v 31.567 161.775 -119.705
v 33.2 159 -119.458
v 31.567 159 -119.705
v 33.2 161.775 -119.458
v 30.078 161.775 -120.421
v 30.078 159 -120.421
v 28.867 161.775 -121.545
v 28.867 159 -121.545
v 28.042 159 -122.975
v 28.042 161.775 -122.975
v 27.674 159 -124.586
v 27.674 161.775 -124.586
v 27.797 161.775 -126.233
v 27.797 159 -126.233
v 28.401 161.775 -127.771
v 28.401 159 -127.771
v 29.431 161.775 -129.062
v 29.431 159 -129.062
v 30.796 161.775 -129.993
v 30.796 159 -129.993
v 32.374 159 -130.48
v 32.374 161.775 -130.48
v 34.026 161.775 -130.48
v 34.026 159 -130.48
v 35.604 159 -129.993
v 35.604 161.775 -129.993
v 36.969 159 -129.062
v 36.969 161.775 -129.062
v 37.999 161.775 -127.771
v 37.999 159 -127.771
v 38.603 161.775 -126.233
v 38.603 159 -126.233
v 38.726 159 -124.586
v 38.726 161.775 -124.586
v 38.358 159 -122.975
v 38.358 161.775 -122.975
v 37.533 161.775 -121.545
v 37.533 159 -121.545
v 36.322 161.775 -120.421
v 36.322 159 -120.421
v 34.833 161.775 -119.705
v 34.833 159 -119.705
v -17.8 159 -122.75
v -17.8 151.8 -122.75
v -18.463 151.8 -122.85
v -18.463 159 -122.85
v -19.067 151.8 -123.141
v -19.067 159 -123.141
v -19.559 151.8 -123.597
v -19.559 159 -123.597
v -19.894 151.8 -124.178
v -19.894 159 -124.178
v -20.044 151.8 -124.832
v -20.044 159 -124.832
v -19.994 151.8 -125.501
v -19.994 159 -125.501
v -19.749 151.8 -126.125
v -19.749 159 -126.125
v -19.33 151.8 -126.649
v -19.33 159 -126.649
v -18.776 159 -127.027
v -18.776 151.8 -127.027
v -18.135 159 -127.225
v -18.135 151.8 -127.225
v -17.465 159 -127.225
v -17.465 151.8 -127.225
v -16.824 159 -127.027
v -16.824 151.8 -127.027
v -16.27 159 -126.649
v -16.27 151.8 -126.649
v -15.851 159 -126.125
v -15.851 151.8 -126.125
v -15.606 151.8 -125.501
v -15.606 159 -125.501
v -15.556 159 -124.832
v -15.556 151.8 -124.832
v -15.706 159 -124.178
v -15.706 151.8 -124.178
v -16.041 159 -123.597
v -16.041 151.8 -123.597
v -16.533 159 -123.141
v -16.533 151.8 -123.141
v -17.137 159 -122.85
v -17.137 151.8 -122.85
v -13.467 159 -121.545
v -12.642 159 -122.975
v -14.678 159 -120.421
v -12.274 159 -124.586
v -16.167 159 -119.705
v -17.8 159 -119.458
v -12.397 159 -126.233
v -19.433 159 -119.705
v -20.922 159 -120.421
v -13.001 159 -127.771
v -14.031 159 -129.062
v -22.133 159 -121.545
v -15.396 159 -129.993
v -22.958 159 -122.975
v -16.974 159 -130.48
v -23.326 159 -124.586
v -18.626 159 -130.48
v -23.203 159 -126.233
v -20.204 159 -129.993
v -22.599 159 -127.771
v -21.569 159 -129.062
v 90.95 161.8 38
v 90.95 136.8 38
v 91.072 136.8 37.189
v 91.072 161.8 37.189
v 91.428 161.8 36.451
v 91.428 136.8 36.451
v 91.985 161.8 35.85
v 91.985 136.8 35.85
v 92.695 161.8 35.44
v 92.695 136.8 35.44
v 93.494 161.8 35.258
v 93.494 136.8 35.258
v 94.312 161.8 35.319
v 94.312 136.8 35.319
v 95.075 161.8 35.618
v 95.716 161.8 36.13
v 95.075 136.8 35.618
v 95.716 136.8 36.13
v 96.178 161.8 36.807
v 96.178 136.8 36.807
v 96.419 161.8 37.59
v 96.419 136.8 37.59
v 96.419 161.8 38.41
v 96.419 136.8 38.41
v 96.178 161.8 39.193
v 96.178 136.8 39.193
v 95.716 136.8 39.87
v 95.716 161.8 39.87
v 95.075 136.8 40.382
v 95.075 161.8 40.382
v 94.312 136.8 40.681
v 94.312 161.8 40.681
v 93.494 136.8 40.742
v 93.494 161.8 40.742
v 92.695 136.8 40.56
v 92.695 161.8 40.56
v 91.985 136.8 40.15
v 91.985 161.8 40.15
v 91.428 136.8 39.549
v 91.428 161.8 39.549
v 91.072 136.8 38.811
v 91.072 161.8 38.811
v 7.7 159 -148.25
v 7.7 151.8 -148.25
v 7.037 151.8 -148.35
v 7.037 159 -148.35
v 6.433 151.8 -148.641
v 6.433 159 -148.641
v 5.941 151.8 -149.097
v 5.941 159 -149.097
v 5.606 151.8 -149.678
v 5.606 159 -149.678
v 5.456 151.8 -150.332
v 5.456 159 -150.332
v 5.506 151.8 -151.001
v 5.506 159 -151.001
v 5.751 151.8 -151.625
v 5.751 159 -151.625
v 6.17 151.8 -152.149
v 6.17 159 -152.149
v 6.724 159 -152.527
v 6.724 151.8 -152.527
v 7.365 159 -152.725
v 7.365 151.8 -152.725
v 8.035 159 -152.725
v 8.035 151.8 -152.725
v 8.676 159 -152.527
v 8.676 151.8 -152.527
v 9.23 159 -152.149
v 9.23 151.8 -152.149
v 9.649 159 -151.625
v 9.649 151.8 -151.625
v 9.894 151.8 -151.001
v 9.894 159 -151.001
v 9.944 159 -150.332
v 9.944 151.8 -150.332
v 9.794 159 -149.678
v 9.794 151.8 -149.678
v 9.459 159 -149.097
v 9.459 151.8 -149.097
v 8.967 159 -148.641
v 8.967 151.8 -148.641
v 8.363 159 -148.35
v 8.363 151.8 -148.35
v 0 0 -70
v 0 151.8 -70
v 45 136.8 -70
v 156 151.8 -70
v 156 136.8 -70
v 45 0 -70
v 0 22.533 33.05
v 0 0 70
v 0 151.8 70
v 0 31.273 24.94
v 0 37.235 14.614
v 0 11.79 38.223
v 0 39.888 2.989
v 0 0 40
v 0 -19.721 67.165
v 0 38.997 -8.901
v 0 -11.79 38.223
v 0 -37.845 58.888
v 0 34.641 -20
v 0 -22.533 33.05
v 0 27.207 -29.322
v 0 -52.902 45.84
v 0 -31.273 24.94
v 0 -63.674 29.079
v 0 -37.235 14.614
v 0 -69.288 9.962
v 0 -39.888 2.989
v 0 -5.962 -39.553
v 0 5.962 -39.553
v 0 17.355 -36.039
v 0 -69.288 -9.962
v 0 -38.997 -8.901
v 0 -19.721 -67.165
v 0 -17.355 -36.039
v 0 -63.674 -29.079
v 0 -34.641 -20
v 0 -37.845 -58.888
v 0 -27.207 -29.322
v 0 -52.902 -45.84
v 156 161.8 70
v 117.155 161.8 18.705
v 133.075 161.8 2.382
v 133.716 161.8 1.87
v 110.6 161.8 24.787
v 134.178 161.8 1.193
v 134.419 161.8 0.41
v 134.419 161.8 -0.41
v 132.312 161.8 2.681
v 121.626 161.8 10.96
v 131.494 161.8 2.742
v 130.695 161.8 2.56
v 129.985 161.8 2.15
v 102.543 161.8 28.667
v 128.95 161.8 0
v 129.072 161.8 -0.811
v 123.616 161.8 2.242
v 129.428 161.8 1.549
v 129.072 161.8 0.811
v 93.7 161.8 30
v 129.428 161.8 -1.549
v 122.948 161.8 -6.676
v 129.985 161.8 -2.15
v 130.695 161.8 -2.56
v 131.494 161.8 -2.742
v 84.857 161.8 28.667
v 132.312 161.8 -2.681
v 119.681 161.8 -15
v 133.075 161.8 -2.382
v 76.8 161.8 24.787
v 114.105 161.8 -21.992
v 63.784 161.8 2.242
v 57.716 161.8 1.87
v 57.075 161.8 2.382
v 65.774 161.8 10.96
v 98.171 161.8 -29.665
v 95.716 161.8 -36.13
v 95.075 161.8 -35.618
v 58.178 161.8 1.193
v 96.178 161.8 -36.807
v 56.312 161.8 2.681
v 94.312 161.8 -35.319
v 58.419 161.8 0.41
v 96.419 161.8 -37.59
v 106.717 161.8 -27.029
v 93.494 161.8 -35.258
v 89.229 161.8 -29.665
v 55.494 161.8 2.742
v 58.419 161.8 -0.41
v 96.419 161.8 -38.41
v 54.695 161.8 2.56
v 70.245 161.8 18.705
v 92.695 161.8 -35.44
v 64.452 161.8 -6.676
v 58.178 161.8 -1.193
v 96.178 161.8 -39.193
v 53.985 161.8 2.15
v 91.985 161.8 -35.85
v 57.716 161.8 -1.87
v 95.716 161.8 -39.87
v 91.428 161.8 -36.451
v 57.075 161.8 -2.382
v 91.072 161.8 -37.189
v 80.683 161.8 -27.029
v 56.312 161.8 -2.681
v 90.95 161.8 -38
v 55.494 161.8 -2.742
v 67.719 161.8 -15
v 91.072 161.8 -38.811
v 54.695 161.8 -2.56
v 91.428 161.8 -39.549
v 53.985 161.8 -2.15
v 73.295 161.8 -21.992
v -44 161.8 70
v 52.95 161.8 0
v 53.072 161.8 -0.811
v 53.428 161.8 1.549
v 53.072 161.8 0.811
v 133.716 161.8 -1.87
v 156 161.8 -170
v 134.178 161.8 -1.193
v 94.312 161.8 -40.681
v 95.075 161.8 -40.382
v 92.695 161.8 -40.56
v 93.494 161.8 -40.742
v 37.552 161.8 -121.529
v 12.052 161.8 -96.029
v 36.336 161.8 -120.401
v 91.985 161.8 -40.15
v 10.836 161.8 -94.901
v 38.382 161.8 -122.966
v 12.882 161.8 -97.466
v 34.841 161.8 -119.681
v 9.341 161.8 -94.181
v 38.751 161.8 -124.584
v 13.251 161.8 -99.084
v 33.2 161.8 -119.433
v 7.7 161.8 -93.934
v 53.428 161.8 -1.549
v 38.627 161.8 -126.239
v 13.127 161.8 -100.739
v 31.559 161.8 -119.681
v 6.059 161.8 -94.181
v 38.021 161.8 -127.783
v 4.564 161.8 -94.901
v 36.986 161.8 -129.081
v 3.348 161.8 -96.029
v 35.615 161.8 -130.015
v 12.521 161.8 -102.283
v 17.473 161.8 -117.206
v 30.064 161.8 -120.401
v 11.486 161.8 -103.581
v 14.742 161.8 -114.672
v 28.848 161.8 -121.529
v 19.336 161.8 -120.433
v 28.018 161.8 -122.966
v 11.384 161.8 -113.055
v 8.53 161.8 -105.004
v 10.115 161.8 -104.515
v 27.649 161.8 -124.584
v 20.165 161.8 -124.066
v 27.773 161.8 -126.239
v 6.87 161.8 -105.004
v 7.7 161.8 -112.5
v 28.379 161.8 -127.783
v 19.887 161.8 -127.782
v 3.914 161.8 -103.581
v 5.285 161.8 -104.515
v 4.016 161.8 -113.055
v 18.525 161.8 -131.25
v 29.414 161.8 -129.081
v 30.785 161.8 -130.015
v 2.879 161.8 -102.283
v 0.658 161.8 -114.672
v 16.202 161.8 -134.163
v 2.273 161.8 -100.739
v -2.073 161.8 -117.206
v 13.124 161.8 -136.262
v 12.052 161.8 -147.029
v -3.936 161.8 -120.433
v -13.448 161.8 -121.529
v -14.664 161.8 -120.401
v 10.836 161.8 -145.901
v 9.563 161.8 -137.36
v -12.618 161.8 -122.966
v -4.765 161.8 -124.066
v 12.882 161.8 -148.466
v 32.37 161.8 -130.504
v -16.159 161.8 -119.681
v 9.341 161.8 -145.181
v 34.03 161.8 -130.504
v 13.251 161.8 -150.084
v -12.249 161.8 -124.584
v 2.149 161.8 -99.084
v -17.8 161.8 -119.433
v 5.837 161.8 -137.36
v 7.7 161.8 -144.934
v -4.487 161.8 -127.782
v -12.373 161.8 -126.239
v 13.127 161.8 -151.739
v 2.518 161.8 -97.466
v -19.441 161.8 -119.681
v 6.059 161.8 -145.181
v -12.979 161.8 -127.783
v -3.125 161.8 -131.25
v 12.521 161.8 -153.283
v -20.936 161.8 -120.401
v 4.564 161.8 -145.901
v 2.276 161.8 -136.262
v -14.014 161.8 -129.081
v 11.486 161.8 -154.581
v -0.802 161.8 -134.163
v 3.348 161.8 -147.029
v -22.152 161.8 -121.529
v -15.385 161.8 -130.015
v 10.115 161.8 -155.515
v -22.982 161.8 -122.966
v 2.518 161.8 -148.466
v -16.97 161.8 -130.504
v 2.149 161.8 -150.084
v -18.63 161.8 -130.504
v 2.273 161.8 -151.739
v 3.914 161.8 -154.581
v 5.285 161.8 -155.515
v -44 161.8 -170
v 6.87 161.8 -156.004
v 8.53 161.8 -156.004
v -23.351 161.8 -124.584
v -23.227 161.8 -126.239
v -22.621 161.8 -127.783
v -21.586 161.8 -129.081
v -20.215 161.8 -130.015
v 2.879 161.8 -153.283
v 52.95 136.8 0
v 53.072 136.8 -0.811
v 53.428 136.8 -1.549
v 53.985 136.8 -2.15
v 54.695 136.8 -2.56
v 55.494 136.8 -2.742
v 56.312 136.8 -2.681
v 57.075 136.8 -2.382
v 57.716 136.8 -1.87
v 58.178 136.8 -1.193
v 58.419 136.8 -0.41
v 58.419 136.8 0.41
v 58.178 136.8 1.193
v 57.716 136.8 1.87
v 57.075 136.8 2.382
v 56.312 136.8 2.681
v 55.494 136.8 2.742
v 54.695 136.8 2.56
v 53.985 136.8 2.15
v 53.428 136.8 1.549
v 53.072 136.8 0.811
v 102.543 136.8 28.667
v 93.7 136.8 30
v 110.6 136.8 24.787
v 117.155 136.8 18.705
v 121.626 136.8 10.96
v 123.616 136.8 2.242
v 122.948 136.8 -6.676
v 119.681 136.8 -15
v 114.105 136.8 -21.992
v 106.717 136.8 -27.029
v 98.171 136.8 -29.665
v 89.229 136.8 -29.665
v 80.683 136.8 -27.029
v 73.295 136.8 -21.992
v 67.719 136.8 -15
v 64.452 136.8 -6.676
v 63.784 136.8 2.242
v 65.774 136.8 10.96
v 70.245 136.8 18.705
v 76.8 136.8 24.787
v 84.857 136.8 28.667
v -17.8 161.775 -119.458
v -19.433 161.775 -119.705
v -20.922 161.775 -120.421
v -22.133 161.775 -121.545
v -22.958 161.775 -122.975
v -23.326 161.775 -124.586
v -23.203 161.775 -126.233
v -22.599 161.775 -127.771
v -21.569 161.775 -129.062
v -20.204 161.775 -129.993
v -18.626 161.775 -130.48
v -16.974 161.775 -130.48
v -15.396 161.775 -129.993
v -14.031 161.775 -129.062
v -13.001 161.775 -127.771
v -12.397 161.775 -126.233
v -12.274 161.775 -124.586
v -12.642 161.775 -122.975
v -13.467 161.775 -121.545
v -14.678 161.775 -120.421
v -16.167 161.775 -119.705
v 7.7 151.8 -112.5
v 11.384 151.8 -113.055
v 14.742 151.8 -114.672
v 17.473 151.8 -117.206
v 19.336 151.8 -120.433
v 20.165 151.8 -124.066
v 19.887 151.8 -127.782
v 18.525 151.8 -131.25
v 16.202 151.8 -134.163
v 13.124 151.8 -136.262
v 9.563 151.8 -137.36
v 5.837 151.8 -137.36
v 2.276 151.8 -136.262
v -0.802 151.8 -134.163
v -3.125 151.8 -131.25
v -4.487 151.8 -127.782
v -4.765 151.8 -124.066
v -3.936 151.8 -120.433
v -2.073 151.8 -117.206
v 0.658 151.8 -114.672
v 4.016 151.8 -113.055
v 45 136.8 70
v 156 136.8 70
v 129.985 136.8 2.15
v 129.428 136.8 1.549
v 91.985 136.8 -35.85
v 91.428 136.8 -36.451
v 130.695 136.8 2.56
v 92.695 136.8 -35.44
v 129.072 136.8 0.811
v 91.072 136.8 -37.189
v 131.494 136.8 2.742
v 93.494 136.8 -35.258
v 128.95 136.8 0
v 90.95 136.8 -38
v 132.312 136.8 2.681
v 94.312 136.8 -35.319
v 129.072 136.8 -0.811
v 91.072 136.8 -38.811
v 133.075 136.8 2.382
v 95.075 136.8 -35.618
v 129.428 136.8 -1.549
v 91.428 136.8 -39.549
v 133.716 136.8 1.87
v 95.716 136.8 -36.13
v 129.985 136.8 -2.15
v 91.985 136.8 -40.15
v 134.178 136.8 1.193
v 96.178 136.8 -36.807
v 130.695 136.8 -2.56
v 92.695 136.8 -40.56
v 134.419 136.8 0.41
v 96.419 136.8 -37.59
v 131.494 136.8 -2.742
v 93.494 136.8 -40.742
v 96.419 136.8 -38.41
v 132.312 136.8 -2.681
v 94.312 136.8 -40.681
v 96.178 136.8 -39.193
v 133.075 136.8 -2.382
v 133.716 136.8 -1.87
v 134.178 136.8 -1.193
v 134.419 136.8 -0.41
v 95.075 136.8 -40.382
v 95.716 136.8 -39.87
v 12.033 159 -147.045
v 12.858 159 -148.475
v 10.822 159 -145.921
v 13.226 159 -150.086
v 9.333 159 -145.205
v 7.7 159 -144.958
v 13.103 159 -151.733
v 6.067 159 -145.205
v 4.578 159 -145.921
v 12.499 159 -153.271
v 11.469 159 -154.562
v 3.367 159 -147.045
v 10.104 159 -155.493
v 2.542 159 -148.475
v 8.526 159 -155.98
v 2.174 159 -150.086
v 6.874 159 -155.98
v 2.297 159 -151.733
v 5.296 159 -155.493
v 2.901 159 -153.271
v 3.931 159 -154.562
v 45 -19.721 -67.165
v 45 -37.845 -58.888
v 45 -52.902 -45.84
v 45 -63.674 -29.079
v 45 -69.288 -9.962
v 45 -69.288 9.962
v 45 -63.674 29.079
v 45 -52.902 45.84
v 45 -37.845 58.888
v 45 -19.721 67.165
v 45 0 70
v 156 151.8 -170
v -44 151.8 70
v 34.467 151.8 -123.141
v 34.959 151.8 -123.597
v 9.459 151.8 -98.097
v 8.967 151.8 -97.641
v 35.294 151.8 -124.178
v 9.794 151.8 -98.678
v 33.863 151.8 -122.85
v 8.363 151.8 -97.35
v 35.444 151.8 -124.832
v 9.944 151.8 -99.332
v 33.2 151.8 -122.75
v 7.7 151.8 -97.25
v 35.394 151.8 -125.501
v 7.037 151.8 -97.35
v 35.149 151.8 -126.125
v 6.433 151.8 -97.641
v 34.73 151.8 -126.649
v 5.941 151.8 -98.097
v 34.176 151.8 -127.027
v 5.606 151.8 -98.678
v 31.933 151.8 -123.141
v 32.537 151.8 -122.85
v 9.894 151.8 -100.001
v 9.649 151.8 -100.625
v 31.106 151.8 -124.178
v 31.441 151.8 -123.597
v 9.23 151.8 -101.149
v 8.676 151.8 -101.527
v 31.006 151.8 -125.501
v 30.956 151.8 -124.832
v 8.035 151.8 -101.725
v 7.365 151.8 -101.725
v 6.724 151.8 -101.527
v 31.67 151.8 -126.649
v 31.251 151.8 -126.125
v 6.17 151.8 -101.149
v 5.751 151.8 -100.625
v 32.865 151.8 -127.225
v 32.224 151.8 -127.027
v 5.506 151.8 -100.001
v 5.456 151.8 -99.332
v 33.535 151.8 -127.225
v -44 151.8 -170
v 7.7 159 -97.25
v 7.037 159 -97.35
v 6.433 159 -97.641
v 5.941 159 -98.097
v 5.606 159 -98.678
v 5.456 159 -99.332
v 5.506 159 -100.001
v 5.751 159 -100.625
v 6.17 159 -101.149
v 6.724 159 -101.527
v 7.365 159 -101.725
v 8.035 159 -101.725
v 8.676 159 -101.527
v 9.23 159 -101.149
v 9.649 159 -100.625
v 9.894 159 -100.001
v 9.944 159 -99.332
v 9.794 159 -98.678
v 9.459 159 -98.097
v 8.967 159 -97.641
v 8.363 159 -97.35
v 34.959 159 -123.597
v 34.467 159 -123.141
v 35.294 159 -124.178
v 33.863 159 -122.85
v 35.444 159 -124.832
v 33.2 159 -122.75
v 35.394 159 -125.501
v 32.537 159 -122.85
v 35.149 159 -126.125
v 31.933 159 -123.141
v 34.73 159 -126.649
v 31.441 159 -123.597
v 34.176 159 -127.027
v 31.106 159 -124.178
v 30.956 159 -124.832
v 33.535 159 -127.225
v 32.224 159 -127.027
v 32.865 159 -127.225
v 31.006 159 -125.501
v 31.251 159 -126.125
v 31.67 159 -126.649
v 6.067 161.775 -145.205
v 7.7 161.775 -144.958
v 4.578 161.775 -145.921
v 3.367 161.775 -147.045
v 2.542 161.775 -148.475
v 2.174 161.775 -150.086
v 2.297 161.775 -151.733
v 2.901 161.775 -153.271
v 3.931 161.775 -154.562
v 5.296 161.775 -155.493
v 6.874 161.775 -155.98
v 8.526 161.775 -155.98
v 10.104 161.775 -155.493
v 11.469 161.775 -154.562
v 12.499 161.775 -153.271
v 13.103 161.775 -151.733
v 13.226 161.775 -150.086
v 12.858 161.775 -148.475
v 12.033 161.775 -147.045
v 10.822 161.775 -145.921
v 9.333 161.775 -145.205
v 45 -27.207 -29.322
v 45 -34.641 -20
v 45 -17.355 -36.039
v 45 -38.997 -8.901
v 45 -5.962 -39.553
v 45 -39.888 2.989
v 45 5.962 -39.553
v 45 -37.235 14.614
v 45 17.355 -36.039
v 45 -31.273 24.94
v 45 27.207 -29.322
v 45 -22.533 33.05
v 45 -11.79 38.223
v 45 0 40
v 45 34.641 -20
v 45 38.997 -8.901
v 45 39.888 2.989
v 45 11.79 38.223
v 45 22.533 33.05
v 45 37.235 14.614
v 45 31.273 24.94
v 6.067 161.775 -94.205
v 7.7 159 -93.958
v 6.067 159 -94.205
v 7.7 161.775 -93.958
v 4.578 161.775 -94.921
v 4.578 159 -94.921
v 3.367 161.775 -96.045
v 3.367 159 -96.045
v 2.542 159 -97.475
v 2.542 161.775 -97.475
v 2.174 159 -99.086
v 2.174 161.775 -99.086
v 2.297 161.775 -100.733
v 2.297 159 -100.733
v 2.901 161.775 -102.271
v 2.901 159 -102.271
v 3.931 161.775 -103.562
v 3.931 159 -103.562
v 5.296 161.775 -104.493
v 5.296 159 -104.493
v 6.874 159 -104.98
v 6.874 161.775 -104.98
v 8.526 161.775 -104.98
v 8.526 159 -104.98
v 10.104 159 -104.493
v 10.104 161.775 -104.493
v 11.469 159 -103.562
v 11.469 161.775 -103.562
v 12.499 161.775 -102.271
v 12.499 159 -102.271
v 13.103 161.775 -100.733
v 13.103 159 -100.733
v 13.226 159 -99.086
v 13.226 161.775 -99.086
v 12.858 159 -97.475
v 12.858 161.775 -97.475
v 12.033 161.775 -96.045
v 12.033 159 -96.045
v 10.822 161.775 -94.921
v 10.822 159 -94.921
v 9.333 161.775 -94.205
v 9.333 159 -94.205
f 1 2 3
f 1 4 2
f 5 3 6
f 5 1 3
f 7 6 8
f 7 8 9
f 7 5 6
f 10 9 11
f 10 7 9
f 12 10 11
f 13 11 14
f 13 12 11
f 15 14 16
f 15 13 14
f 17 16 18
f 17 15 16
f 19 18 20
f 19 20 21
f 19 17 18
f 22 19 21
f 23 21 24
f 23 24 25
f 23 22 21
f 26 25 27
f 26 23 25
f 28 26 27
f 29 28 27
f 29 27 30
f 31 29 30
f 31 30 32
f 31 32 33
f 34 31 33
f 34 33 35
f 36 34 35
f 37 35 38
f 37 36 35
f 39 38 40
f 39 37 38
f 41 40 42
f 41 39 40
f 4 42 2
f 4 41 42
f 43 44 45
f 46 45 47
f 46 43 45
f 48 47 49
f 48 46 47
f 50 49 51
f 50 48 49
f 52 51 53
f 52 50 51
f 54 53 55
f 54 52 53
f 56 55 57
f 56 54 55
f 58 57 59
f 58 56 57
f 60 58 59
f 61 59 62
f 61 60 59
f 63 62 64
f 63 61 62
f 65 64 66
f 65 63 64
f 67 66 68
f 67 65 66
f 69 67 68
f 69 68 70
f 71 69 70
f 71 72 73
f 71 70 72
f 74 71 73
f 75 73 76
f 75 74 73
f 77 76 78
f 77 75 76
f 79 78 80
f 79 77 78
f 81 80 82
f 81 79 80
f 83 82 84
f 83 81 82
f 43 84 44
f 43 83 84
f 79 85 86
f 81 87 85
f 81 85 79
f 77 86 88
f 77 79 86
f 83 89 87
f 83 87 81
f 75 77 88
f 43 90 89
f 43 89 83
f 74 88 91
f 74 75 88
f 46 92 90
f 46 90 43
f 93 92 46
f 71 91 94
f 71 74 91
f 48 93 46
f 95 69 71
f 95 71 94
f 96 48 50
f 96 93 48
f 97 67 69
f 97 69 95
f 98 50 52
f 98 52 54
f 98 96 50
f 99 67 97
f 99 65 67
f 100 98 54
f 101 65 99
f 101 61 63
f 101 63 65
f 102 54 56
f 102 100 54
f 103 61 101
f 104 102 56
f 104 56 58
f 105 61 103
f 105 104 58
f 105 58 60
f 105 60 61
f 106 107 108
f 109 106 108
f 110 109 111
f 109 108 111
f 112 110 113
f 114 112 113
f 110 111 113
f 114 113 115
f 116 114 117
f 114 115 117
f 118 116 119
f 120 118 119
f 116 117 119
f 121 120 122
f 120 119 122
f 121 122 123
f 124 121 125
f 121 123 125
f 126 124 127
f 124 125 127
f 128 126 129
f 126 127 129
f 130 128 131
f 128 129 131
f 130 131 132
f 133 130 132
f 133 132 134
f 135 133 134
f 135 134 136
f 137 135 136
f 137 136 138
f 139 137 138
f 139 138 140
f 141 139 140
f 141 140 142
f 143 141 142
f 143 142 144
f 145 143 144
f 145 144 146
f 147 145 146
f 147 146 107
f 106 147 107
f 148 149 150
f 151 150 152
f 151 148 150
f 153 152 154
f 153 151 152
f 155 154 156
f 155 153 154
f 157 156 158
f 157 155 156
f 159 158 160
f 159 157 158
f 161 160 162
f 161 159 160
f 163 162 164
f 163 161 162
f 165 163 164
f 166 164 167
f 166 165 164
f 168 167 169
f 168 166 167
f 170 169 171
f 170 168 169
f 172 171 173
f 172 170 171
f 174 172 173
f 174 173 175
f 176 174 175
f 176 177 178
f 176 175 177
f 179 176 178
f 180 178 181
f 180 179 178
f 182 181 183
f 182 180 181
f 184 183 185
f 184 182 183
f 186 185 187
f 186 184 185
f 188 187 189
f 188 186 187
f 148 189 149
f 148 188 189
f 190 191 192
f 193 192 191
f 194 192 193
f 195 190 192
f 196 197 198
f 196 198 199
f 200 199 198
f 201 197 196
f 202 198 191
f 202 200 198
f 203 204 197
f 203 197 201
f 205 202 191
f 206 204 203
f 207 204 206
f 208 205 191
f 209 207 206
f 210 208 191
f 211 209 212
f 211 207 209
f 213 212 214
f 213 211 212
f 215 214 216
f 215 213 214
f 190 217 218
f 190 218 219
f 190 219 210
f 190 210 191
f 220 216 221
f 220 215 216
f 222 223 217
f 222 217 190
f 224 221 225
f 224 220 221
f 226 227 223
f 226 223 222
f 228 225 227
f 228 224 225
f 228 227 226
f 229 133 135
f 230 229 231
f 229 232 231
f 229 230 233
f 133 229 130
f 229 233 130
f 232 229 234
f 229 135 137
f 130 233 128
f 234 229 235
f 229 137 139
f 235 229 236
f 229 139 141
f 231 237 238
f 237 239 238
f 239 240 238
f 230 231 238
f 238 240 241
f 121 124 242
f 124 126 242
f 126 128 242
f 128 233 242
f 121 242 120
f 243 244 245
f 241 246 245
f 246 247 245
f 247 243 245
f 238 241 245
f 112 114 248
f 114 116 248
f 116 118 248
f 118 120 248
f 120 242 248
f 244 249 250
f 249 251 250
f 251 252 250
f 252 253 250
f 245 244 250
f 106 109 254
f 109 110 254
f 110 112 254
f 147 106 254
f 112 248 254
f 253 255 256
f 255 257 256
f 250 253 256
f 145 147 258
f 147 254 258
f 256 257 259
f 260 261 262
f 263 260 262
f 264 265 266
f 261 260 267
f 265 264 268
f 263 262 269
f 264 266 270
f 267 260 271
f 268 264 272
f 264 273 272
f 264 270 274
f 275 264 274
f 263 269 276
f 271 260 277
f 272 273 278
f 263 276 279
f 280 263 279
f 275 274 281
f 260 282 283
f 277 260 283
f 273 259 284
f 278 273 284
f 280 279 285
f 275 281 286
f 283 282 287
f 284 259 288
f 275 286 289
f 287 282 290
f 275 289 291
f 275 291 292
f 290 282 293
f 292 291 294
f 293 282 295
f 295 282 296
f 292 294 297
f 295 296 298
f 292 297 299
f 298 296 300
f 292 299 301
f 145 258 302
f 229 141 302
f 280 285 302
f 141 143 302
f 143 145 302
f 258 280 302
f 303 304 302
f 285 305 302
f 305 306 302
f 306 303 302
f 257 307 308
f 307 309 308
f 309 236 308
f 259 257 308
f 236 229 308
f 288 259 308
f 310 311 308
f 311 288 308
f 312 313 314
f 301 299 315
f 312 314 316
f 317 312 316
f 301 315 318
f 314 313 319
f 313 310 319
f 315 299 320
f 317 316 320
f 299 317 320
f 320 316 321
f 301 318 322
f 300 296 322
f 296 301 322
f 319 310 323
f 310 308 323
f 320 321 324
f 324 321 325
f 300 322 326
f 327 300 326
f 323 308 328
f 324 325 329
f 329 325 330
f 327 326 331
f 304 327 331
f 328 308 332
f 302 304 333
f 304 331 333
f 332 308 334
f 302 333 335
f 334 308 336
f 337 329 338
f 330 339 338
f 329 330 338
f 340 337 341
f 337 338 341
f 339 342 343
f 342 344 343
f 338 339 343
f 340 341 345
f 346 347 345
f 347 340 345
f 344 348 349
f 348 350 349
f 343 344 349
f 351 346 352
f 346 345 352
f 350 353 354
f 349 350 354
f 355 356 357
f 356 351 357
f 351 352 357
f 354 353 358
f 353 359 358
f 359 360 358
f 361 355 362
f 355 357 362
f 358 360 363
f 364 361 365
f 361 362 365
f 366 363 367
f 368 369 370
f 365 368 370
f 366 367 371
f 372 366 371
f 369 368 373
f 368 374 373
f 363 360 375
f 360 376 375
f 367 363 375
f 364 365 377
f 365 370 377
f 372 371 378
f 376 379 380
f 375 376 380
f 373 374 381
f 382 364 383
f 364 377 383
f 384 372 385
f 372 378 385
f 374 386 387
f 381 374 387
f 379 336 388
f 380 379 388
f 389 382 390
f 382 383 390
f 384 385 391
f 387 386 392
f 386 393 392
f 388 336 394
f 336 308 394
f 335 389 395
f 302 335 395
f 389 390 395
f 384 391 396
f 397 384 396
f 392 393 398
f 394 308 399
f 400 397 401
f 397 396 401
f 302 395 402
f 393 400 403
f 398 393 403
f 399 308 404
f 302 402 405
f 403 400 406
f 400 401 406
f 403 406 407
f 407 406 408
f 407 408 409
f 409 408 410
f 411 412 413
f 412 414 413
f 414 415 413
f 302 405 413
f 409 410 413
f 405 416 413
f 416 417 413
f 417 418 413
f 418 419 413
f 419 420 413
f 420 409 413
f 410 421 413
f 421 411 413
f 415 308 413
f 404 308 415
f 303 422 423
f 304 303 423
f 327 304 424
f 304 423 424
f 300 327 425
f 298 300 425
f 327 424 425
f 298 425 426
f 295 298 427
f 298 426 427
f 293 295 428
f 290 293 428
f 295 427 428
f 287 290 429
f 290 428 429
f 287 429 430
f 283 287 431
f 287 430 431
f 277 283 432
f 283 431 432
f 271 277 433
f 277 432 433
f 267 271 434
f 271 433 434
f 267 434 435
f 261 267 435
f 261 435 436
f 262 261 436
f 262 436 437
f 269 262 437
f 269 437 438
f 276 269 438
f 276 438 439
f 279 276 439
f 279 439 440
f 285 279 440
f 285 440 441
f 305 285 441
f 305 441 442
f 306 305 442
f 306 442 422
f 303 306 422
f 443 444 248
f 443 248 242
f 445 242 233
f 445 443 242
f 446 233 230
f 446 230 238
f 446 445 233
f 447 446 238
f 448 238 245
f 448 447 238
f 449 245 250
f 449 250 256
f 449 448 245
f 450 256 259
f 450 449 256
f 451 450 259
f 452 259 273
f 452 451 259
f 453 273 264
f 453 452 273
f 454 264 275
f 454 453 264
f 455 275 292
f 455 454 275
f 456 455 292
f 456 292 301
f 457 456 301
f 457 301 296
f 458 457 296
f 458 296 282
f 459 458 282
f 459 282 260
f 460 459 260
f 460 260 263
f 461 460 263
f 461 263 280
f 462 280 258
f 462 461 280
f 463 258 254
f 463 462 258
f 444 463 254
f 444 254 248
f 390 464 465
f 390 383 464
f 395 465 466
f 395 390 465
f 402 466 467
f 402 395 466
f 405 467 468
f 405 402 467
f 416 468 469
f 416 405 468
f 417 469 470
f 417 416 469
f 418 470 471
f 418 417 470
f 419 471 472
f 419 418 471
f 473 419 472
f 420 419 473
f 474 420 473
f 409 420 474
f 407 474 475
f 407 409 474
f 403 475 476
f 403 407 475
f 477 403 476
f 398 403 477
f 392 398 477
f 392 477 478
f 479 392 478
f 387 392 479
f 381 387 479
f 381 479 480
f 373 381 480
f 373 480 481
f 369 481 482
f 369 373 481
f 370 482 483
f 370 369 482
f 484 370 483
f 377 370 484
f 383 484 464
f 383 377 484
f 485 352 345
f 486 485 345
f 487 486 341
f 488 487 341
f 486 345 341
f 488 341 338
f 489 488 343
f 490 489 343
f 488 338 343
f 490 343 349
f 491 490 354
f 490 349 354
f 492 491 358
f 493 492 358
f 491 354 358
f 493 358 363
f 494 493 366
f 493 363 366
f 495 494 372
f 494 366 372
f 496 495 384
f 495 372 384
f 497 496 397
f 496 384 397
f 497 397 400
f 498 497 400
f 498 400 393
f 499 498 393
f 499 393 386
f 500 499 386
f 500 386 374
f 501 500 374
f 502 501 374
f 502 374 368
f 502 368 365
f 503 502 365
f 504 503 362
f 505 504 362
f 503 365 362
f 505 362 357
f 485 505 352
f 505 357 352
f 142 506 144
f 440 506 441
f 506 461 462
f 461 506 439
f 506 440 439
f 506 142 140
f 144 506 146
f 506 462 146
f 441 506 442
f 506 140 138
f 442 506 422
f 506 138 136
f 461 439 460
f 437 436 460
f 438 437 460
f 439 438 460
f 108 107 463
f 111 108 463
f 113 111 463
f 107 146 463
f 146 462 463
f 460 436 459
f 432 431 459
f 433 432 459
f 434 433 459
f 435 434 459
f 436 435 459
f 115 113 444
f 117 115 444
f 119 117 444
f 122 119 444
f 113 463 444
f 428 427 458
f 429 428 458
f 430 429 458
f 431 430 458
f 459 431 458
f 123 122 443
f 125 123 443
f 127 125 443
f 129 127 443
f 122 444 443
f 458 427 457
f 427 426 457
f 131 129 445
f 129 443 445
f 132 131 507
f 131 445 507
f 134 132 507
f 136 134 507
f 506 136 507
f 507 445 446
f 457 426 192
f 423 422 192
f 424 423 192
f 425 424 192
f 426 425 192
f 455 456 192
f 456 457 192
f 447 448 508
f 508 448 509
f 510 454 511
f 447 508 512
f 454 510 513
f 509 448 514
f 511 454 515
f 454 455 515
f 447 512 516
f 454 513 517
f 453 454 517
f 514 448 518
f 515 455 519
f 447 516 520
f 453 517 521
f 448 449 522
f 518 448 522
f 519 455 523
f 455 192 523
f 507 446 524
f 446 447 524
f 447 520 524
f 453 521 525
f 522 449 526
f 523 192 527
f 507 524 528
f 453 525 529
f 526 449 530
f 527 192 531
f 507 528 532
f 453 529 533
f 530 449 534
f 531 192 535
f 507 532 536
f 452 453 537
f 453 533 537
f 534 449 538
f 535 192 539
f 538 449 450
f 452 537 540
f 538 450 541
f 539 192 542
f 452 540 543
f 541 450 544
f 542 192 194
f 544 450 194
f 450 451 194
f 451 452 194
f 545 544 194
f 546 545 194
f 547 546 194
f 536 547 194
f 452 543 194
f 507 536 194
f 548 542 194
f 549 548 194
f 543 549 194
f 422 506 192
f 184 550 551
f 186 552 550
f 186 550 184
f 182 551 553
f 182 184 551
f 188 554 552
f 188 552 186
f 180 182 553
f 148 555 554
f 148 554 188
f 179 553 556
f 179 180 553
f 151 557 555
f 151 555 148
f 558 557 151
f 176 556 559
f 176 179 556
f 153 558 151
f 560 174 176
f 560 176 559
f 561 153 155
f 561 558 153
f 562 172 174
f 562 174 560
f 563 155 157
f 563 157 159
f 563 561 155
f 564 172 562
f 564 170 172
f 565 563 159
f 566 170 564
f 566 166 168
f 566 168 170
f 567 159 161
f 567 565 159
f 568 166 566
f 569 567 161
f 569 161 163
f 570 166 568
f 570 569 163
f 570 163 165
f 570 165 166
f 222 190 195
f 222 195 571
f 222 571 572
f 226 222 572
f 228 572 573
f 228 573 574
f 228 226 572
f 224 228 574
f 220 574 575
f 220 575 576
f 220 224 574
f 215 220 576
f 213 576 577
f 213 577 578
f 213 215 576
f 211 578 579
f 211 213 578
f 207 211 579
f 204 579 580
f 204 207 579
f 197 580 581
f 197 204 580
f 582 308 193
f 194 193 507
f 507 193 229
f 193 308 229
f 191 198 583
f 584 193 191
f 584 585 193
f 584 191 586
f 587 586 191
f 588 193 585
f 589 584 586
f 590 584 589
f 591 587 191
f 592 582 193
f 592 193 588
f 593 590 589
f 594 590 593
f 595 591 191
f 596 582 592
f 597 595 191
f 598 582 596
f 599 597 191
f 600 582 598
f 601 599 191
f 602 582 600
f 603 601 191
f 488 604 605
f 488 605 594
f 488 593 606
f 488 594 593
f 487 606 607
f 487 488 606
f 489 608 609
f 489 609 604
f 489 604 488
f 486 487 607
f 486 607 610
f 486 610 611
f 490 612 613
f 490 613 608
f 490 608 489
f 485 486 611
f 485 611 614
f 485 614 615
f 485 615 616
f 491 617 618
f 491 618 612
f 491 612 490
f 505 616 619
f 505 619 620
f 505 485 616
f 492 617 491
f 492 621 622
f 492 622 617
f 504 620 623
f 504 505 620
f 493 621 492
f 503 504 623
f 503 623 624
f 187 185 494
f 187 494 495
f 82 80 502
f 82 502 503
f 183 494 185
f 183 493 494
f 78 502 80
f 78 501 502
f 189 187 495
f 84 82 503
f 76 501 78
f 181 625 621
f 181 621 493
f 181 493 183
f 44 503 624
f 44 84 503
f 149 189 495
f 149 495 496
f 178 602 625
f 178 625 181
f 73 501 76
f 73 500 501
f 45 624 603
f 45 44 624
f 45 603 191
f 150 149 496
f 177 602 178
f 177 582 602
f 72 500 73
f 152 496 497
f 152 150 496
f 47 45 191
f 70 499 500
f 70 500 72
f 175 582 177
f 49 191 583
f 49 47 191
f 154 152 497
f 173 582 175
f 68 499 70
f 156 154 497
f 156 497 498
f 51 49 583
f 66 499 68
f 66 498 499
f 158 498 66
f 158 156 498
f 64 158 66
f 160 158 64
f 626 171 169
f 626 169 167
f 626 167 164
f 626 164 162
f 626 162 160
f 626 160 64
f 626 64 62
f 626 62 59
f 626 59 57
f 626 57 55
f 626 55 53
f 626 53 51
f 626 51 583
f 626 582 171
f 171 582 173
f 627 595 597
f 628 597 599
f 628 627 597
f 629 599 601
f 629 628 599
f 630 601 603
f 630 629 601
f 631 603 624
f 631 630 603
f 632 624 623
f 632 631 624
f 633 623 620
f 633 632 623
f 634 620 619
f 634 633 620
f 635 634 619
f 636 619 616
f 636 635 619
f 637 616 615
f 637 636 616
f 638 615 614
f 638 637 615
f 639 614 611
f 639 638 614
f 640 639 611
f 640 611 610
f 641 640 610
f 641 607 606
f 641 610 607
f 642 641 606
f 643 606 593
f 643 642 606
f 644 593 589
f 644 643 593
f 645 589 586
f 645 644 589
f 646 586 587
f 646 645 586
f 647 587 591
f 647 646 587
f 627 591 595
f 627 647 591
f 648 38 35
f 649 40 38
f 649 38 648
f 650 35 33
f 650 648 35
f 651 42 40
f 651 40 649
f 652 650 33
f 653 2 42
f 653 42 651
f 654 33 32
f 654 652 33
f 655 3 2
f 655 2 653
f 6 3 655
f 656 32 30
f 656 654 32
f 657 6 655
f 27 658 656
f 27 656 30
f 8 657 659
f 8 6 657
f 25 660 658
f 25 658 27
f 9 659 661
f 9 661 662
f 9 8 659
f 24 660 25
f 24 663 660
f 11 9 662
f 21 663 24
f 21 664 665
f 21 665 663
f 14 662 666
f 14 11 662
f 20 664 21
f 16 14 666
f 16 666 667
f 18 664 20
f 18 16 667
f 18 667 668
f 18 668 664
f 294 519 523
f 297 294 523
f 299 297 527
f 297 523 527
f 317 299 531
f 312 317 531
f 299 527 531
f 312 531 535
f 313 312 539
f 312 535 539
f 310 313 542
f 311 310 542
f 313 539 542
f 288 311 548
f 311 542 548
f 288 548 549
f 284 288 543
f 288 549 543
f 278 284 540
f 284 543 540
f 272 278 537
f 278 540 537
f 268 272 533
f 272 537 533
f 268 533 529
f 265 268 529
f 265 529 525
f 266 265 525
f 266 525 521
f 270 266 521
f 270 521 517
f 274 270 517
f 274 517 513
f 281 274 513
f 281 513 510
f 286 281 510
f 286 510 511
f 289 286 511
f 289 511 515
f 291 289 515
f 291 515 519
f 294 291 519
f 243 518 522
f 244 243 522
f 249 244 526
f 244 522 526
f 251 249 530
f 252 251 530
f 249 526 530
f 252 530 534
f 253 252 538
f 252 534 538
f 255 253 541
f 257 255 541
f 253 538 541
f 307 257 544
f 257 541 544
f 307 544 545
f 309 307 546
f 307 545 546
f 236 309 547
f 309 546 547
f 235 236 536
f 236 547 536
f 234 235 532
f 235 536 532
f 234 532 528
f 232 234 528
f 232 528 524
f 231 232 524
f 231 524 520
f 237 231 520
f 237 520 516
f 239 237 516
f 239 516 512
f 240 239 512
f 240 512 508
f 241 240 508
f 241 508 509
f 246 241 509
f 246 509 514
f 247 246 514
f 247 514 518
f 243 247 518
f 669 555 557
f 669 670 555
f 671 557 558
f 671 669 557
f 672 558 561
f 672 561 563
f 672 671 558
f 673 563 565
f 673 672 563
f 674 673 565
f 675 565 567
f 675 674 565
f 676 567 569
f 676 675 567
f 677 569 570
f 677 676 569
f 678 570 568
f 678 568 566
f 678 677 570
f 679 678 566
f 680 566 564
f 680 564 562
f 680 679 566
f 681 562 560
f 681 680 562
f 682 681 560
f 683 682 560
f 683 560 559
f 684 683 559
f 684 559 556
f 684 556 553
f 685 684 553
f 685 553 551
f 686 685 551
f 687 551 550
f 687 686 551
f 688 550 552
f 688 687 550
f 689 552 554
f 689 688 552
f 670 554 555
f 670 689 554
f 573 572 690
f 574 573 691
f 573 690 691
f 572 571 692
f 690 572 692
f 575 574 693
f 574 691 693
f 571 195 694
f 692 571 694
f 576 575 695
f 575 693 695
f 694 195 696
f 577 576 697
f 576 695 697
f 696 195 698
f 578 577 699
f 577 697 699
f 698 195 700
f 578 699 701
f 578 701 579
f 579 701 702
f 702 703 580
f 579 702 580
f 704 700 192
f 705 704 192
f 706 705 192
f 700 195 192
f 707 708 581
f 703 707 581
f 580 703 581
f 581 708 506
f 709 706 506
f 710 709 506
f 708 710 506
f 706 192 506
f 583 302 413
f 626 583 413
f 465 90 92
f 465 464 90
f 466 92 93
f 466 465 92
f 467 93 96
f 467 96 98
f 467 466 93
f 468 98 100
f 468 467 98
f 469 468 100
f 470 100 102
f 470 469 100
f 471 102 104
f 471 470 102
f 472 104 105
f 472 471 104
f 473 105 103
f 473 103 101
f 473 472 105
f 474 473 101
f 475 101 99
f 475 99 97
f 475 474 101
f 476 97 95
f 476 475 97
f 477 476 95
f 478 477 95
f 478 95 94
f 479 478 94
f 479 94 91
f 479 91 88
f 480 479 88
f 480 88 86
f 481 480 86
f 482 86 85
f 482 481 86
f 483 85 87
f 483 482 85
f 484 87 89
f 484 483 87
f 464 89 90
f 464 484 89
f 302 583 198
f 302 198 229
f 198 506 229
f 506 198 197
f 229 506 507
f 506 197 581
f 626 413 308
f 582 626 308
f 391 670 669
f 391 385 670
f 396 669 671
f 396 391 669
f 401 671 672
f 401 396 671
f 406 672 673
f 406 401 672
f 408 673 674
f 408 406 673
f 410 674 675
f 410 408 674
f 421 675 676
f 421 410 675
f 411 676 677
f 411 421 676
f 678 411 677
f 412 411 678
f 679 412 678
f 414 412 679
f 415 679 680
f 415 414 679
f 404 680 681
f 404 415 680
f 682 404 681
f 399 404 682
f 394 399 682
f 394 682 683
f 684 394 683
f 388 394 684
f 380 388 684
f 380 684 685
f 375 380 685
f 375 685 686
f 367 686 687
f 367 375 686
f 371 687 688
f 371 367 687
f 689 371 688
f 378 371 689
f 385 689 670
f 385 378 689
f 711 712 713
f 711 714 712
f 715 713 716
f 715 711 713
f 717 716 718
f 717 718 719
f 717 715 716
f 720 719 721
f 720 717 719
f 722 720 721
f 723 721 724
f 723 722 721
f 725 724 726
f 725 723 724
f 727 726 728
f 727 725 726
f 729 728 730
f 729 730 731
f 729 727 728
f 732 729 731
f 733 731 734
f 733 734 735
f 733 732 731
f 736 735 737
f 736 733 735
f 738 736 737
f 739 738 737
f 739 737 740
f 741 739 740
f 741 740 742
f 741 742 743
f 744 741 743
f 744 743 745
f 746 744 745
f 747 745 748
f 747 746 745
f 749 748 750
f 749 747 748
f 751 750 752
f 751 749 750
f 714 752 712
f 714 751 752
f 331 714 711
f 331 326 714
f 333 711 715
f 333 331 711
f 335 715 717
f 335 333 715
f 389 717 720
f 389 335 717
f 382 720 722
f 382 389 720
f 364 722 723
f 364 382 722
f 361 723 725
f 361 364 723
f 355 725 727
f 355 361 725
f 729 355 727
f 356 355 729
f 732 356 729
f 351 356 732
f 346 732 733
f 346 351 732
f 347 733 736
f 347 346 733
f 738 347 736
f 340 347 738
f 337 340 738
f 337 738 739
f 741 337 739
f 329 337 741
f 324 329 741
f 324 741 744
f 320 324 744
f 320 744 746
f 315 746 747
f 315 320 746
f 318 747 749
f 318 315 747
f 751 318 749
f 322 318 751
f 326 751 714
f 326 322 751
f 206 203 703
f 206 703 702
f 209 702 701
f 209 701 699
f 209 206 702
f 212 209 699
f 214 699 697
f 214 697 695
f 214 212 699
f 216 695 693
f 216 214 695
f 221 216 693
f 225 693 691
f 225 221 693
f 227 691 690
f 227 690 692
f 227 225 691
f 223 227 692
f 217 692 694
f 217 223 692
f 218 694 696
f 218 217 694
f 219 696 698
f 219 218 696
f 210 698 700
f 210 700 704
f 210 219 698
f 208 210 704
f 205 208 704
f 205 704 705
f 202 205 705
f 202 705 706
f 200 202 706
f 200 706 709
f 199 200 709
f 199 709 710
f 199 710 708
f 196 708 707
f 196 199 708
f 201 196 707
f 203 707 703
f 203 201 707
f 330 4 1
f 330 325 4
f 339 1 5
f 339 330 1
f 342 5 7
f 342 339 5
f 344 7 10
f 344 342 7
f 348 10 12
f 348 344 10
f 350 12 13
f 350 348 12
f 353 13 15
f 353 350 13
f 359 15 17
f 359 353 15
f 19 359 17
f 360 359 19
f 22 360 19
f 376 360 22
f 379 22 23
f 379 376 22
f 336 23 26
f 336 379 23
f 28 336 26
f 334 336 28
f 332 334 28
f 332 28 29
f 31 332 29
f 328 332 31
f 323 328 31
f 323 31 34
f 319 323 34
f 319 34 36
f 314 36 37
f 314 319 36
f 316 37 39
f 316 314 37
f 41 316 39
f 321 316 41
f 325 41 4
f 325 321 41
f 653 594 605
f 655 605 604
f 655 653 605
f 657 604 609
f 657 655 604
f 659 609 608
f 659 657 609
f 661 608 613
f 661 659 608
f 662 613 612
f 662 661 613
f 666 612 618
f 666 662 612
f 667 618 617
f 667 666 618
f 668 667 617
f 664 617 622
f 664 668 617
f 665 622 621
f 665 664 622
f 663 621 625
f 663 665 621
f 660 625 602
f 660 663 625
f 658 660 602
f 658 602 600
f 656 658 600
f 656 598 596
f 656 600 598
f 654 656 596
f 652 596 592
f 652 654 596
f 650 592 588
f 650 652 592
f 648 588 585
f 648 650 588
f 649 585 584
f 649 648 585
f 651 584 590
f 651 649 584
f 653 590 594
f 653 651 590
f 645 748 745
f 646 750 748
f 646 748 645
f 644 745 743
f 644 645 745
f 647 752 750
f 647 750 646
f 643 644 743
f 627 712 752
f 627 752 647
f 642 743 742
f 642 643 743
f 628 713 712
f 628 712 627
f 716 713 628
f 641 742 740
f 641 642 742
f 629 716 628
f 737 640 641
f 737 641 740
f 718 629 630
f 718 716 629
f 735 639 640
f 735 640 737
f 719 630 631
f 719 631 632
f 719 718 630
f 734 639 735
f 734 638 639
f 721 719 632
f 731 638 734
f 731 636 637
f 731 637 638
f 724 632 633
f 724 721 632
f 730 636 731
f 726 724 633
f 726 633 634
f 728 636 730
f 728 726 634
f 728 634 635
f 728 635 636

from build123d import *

# Parameters (mm, degrees)
SCHIZZO1_R                                   = 40
ESTRUSIONE_ESTRUSIONE1_DEPTH                 = 45
SCHIZZO2_W                                   = 156
SCHIZZO2_H                                   = 140
SCHIZZO2_R                                   = 30
ESTRUSIONE_ESTRUSIONE2_DEPTH                 = 25
ESTRUSIONE_ESTRUSIONE4_DEPTH                 = 10
SCHIZZO6_R                                   = 12.5
TAGLIO_ESTRUSIONE1_DEPTH                     = 10
FORO_LAMATO_PER_VITE_M4_A_TESTA_ESAG_2_COUNT = 2
FORO_LAMATO_PER_VITE_M4_A_TESTA_ESAG_2_PITCH = 36.062445841
FORO_LAMATO_PER_VITE_M4_A_TESTA_ESAG_3_COUNT = 2
FORO_LAMATO_PER_VITE_M4_A_TESTA_ESAG_3_PITCH = 51
FORO_LAMATO_PER_VITE_M4_A_TESTA_ESAG_4_COUNT = 2
FORO_LAMATO_PER_VITE_M4_A_TESTA_ESAG_4_PITCH = 36.062445841
FORO_PER_VITE_M5_1_D                         = 5.5


with BuildPart() as part:
    # Schizzo1 → Estrusione-Estrusione1 (new body)
    with BuildSketch(Plane(origin=(0, 0, 0), x_dir=(0, 0, -1), z_dir=(1, 0, 0))):
        with BuildLine():
            Line((-70, 0), (-70, 136.8))
            Line((-70, 136.8), (70, 136.8))
            Line((70, 136.8), (70, 0))
            ThreePointArc((70, 0), (0, -70), (-70, 0))
        make_face()
        with Locations(Location((0, 0, 0), (0, 0, 180))):
            Circle(SCHIZZO1_R, mode=Mode.SUBTRACT)
    extrude(amount=ESTRUSIONE_ESTRUSIONE1_DEPTH)

    # Schizzo2 → Estrusione-Estrusione2 (add)
    with BuildSketch(Plane(origin=(0, 136.8, 0), x_dir=(1, 0, 0), z_dir=(0, 1, 0))):
        with Locations((78, 0)):
            Rectangle(SCHIZZO2_W, SCHIZZO2_H)
        with Locations(Location((93.7, 0, 0), (0, 0, 270))):
            Circle(SCHIZZO2_R, mode=Mode.SUBTRACT)
    extrude(amount=ESTRUSIONE_ESTRUSIONE2_DEPTH)

    # Schizzo5 → Estrusione-Estrusione4 (add)
    with BuildSketch(Plane(origin=(0, 161.8, 0), x_dir=(1, 0, 0), z_dir=(0, 1, 0))):
        Polygon((156, 170), (156, 70), (0, 70), (0, -70), (-44, -70), (-44, 170), align=None)
    extrude(amount=-ESTRUSIONE_ESTRUSIONE4_DEPTH)

    # Schizzo6 → Taglio-Estrusione1 (cut)
    with BuildSketch(Plane(origin=(0, 161.8, 0), x_dir=(1, 0, 0), z_dir=(0, 1, 0))):
        with Locations(Location((7.7, 125, 0), (0, 0, 270))):
            Circle(SCHIZZO6_R)
    extrude(amount=-TAGLIO_ESTRUSIONE1_DEPTH, mode=Mode.SUBTRACT)

    # Schizzo8 → Foro lamato per Vite M4 a testa esagonale-1 (revolve, cut)
    with BuildSketch(Plane(origin=(7.7, 161.8, -150.5), x_dir=(0, 0, 1), z_dir=(1, 0, 0))):
        Polygon((0, 0), (0, 231.8), (2.25, 231.8), (2.25, 2.8), (5.5415, 2.8), (5.5415, 0.025), (5.5665, 0), align=None)
    foro_lamato_per_vite_m4_a_testa_esagonal = revolve(axis=Axis((7.7, 168.15, -150.5), (0, -1, 0)), mode=Mode.SUBTRACT)

    # Foro lamato per Vite M4 a testa esag 2: Foro lamato per Vite M4 a testa esagonale-1 ×2
    with Locations(*[Vector(-0.7071067811865476, 0, 0.7071067811865476) * (i * FORO_LAMATO_PER_VITE_M4_A_TESTA_ESAG_2_PITCH) for i in range(1, FORO_LAMATO_PER_VITE_M4_A_TESTA_ESAG_2_COUNT)]):
        add(foro_lamato_per_vite_m4_a_testa_esagonal, mode=Mode.SUBTRACT)

    # Foro lamato per Vite M4 a testa esag 3: Foro lamato per Vite M4 a testa esagonale-1 ×2
    with Locations(*[(0, 0, i * FORO_LAMATO_PER_VITE_M4_A_TESTA_ESAG_3_PITCH) for i in range(1, FORO_LAMATO_PER_VITE_M4_A_TESTA_ESAG_3_COUNT)]):
        add(foro_lamato_per_vite_m4_a_testa_esagonal, mode=Mode.SUBTRACT)

    # Foro lamato per Vite M4 a testa esag 4: Foro lamato per Vite M4 a testa esagonale-1 ×2
    with Locations(*[Vector(0.7071067811865475, 0, 0.7071067811865476) * (i * FORO_LAMATO_PER_VITE_M4_A_TESTA_ESAG_4_PITCH) for i in range(1, FORO_LAMATO_PER_VITE_M4_A_TESTA_ESAG_4_COUNT)]):
        add(foro_lamato_per_vite_m4_a_testa_esagonal, mode=Mode.SUBTRACT)

    # Foro per Vite M5-1 (through all)
    with Locations(Plane(origin=(0, 161.8, 0), x_dir=(1, 0, 0), z_dir=(0, 1, 0))):
        with Locations((93.7, 38), (93.7, -38), (55.7, 0), (131.7, 0)):
            Hole(FORO_PER_VITE_M5_1_D / 2)


solid = part.part
